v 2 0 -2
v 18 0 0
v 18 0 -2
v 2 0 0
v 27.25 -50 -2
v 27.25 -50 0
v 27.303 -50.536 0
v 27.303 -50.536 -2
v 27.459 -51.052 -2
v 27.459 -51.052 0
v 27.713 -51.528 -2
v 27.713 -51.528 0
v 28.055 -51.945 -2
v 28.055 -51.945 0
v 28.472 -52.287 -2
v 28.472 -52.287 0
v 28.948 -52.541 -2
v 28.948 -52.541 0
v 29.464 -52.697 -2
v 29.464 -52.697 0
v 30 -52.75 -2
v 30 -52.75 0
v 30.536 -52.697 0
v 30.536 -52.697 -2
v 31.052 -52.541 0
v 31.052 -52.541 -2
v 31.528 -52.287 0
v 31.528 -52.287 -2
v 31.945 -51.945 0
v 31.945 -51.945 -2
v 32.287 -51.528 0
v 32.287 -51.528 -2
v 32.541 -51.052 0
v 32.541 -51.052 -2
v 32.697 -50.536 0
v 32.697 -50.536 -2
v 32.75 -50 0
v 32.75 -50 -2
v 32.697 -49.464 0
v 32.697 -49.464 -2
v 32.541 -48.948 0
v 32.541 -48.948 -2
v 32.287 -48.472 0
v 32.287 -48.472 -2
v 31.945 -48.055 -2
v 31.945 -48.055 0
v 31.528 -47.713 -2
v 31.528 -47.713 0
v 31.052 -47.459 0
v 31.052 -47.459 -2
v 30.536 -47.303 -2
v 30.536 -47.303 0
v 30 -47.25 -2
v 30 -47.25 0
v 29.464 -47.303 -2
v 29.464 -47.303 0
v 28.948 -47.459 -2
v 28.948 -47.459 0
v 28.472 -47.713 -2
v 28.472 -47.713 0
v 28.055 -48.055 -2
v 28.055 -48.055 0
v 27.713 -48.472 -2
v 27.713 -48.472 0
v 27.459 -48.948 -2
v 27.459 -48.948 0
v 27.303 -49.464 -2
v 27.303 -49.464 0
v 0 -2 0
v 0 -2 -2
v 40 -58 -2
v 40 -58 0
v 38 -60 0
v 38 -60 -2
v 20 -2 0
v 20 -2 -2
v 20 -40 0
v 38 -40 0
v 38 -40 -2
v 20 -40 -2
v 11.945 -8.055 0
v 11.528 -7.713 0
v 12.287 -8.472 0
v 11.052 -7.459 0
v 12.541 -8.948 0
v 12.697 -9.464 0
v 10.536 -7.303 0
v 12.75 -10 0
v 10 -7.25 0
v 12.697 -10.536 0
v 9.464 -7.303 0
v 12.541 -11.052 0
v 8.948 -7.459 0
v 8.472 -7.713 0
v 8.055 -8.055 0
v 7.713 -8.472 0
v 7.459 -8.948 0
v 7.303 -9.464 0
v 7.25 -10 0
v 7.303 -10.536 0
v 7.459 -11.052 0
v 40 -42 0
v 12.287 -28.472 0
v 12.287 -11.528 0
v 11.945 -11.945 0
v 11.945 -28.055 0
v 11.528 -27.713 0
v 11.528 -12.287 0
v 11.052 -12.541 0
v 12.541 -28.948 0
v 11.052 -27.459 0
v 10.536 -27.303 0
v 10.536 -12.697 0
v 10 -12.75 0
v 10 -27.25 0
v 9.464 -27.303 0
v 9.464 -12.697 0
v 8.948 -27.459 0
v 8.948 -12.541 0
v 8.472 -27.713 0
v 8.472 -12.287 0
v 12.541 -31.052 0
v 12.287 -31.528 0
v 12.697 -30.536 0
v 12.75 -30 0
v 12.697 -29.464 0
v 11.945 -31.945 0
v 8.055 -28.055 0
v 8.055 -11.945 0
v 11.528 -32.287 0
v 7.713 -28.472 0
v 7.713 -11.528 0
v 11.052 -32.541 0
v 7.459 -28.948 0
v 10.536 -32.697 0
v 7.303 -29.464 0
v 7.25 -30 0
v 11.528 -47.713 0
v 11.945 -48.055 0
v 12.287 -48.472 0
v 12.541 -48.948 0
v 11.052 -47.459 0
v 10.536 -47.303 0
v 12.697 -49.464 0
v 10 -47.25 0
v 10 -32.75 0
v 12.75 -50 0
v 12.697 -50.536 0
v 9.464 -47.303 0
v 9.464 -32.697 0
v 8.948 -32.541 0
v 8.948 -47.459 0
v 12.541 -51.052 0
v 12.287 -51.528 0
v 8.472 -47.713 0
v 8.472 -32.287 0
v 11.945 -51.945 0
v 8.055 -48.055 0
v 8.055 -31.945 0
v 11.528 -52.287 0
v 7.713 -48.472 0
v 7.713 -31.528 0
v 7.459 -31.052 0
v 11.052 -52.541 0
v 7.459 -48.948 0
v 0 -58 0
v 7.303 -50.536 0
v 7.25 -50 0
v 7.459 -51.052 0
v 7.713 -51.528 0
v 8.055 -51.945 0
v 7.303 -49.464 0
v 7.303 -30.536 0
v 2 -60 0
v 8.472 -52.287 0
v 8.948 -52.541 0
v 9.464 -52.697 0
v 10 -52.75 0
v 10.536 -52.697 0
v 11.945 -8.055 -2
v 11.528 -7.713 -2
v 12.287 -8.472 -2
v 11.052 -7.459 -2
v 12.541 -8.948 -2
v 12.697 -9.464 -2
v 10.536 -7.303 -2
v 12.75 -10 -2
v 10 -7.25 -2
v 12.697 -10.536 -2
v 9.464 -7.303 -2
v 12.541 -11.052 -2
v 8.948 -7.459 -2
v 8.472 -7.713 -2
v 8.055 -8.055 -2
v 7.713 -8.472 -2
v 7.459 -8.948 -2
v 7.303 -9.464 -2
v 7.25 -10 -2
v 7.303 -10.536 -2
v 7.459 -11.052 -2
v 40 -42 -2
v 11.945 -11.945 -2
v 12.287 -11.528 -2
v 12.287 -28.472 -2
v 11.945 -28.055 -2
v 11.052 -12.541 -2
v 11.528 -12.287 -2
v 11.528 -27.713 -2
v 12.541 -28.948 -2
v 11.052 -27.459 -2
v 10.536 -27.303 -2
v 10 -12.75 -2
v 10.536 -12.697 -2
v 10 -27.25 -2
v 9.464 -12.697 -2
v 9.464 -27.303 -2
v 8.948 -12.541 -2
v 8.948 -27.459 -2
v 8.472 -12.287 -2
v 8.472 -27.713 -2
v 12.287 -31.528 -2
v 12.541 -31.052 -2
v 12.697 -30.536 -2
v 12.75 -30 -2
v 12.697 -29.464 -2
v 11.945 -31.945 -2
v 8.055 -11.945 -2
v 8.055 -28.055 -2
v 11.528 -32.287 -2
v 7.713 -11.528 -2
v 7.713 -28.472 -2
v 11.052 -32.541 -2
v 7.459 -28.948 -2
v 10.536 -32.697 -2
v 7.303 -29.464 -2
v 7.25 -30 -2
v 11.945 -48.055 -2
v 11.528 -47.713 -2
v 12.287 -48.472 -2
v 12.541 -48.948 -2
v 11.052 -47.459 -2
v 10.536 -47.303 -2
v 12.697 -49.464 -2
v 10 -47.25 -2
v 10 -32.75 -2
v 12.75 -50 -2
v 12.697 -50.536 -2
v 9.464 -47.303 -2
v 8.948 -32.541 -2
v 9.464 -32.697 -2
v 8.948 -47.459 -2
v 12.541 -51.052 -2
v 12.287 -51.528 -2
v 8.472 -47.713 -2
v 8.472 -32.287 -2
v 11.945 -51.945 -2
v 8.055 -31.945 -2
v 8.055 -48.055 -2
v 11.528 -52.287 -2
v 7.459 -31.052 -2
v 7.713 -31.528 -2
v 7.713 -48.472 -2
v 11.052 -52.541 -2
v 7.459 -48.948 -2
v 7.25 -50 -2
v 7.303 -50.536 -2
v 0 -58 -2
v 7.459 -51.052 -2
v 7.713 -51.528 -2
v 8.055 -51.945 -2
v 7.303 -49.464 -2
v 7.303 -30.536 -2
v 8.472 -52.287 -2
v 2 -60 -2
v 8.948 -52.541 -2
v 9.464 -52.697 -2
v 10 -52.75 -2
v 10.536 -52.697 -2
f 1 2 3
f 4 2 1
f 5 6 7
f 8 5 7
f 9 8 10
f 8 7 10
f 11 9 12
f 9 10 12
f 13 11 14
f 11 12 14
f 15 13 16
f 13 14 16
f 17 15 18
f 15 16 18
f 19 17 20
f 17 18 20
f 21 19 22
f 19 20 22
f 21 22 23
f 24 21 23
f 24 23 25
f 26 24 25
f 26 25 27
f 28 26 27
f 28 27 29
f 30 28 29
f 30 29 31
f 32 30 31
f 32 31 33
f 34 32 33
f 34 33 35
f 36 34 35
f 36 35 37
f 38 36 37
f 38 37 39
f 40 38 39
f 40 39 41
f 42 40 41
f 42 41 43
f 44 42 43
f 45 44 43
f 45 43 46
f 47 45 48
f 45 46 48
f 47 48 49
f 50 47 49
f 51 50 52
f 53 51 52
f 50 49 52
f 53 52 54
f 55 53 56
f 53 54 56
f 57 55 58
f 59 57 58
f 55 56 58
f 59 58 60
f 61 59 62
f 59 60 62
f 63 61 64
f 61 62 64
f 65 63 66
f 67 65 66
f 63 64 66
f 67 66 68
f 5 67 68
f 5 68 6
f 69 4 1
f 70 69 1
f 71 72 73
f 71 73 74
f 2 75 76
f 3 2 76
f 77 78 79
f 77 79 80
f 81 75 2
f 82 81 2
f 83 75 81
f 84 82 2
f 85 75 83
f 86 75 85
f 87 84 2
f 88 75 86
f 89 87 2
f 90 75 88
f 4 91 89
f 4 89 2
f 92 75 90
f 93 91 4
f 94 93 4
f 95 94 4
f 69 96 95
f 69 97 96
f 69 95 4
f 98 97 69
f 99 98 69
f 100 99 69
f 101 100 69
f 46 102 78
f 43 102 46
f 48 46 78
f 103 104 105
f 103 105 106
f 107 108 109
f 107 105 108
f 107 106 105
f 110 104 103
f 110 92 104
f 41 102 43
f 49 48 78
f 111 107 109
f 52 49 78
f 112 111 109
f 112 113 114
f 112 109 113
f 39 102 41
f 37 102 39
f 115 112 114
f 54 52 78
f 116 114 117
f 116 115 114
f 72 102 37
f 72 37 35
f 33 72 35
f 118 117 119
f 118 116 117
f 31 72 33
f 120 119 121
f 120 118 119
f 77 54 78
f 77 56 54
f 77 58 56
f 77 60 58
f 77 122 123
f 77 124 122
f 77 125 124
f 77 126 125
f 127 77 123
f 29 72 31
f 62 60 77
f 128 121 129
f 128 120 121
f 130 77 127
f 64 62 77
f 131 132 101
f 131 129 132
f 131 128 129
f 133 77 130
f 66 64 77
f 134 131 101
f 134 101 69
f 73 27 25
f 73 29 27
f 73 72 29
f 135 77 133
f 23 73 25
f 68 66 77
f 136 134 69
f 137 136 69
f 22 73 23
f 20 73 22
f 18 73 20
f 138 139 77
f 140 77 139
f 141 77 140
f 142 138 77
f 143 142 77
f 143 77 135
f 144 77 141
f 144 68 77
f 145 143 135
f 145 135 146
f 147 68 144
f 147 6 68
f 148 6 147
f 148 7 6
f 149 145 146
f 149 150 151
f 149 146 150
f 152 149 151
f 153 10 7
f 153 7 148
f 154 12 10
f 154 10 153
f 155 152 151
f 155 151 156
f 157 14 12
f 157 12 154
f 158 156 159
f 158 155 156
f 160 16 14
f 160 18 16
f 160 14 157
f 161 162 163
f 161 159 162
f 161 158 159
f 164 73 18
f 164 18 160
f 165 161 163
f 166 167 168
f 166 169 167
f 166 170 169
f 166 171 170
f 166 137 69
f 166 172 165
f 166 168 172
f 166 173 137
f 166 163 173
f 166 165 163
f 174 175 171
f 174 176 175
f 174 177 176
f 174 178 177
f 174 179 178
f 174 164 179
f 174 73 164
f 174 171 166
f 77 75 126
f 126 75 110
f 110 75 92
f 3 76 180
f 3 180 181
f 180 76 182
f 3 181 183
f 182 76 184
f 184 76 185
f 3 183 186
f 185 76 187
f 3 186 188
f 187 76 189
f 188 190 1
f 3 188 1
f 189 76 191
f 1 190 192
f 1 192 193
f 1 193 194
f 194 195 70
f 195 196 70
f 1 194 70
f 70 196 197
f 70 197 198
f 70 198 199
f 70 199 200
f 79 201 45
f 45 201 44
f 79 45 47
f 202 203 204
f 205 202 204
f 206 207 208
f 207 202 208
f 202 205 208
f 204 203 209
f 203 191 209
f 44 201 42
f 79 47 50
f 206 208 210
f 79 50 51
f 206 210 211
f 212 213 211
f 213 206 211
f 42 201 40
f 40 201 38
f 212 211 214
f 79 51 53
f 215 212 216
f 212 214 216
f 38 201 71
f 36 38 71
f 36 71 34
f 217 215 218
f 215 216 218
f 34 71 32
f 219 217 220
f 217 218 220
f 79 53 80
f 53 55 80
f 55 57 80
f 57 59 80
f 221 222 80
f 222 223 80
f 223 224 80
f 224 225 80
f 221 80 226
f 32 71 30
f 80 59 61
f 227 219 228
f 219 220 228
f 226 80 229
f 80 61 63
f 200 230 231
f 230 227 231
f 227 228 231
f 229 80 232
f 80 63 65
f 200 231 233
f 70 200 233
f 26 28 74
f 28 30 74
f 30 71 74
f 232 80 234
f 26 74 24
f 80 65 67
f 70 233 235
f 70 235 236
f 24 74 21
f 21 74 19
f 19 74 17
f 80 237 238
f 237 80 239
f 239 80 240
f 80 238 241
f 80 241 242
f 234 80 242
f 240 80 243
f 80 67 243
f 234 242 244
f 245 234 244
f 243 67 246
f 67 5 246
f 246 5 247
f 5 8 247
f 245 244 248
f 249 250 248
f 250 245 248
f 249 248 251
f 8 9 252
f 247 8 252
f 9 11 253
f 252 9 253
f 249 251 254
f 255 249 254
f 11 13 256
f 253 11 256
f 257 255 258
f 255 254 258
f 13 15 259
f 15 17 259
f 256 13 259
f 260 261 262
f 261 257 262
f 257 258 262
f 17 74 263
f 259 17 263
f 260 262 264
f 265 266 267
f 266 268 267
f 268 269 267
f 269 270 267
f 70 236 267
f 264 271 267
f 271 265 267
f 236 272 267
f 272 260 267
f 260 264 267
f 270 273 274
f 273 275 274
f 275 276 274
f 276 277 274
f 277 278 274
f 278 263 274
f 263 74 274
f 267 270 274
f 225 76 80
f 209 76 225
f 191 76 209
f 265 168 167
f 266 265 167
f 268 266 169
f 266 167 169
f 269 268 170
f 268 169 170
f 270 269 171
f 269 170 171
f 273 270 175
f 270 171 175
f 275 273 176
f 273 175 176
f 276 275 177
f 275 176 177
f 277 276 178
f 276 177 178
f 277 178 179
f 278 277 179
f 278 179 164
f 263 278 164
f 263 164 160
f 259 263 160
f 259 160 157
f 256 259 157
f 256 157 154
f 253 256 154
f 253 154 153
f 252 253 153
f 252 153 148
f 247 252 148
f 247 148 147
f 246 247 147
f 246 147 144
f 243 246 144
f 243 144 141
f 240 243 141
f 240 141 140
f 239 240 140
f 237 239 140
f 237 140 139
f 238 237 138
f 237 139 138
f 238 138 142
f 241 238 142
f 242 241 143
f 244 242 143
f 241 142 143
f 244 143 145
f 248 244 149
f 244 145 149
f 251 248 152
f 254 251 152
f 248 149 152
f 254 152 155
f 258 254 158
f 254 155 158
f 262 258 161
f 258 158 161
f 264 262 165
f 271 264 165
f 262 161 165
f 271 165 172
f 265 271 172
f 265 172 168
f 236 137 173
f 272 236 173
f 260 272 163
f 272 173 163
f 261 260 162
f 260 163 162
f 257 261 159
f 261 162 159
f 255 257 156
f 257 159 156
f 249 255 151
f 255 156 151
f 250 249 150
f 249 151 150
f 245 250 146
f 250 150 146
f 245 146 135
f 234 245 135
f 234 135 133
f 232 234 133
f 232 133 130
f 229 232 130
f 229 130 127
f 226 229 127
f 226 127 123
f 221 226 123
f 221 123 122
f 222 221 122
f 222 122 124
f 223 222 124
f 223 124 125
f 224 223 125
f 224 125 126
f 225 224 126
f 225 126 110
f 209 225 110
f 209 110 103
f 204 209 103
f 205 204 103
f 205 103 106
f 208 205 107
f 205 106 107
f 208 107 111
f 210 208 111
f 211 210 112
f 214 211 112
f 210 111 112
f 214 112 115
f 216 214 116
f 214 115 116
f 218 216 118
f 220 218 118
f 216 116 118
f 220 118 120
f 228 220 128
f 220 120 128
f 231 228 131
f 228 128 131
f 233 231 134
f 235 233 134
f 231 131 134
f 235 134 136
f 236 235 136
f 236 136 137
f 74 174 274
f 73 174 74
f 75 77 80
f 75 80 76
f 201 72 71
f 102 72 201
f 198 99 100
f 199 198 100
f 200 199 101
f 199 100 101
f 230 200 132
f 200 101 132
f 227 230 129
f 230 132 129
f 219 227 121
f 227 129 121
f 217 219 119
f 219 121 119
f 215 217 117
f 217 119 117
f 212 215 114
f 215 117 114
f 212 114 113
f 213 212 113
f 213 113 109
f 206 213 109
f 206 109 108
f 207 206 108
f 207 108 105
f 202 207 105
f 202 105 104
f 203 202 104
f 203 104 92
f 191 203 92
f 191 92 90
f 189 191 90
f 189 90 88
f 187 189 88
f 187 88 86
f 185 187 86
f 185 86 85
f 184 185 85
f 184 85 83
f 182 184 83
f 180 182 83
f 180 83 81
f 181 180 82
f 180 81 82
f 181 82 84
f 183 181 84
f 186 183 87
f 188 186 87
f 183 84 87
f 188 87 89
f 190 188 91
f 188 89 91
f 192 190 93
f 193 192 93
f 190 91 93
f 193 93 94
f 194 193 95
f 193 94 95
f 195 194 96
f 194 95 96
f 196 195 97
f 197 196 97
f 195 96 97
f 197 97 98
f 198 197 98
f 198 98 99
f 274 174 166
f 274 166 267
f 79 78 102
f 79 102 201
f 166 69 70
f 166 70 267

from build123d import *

# Parameters (mm, degrees)
EXTRUDE_1_DEPTH   = 2
HOLE_WIZARD_M51_D = 5.5
CHAMFER_1_SIZE    = 2


with BuildPart() as part:
    # Эскиз1 → Бобышка-Вытянуть1 (new body)
    with BuildSketch(Plane(origin=(0, 0, 0), x_dir=(1, 0, 0), z_dir=(0, 0, -1))):
        Polygon((0, 0), (0, 60), (40, 60), (40, 40), (20, 40), (20, 0), align=None)
    extrude(amount=EXTRUDE_1_DEPTH)

    # Отверстие с зазором M51 (through all)
    with Locations(Plane(origin=(0, 0, -2), x_dir=(1, 0, 0), z_dir=(0, 0, -1))):
        with Locations((30, 50), (10, 50), (10, 30), (10, 10)):
            Hole(HOLE_WIZARD_M51_D / 2)

    # Фаска1
    chamfer_1_edges = [part.edges().sort_by_distance(p)[0] for p in [
        (0, 0, -1),
        (0, -60, -1),
        (40, -60, -1),
        (40, -40, -1),
        (20, 0, -1),
    ]]
    chamfer(chamfer_1_edges, length=CHAMFER_1_SIZE)


solid = part.part
